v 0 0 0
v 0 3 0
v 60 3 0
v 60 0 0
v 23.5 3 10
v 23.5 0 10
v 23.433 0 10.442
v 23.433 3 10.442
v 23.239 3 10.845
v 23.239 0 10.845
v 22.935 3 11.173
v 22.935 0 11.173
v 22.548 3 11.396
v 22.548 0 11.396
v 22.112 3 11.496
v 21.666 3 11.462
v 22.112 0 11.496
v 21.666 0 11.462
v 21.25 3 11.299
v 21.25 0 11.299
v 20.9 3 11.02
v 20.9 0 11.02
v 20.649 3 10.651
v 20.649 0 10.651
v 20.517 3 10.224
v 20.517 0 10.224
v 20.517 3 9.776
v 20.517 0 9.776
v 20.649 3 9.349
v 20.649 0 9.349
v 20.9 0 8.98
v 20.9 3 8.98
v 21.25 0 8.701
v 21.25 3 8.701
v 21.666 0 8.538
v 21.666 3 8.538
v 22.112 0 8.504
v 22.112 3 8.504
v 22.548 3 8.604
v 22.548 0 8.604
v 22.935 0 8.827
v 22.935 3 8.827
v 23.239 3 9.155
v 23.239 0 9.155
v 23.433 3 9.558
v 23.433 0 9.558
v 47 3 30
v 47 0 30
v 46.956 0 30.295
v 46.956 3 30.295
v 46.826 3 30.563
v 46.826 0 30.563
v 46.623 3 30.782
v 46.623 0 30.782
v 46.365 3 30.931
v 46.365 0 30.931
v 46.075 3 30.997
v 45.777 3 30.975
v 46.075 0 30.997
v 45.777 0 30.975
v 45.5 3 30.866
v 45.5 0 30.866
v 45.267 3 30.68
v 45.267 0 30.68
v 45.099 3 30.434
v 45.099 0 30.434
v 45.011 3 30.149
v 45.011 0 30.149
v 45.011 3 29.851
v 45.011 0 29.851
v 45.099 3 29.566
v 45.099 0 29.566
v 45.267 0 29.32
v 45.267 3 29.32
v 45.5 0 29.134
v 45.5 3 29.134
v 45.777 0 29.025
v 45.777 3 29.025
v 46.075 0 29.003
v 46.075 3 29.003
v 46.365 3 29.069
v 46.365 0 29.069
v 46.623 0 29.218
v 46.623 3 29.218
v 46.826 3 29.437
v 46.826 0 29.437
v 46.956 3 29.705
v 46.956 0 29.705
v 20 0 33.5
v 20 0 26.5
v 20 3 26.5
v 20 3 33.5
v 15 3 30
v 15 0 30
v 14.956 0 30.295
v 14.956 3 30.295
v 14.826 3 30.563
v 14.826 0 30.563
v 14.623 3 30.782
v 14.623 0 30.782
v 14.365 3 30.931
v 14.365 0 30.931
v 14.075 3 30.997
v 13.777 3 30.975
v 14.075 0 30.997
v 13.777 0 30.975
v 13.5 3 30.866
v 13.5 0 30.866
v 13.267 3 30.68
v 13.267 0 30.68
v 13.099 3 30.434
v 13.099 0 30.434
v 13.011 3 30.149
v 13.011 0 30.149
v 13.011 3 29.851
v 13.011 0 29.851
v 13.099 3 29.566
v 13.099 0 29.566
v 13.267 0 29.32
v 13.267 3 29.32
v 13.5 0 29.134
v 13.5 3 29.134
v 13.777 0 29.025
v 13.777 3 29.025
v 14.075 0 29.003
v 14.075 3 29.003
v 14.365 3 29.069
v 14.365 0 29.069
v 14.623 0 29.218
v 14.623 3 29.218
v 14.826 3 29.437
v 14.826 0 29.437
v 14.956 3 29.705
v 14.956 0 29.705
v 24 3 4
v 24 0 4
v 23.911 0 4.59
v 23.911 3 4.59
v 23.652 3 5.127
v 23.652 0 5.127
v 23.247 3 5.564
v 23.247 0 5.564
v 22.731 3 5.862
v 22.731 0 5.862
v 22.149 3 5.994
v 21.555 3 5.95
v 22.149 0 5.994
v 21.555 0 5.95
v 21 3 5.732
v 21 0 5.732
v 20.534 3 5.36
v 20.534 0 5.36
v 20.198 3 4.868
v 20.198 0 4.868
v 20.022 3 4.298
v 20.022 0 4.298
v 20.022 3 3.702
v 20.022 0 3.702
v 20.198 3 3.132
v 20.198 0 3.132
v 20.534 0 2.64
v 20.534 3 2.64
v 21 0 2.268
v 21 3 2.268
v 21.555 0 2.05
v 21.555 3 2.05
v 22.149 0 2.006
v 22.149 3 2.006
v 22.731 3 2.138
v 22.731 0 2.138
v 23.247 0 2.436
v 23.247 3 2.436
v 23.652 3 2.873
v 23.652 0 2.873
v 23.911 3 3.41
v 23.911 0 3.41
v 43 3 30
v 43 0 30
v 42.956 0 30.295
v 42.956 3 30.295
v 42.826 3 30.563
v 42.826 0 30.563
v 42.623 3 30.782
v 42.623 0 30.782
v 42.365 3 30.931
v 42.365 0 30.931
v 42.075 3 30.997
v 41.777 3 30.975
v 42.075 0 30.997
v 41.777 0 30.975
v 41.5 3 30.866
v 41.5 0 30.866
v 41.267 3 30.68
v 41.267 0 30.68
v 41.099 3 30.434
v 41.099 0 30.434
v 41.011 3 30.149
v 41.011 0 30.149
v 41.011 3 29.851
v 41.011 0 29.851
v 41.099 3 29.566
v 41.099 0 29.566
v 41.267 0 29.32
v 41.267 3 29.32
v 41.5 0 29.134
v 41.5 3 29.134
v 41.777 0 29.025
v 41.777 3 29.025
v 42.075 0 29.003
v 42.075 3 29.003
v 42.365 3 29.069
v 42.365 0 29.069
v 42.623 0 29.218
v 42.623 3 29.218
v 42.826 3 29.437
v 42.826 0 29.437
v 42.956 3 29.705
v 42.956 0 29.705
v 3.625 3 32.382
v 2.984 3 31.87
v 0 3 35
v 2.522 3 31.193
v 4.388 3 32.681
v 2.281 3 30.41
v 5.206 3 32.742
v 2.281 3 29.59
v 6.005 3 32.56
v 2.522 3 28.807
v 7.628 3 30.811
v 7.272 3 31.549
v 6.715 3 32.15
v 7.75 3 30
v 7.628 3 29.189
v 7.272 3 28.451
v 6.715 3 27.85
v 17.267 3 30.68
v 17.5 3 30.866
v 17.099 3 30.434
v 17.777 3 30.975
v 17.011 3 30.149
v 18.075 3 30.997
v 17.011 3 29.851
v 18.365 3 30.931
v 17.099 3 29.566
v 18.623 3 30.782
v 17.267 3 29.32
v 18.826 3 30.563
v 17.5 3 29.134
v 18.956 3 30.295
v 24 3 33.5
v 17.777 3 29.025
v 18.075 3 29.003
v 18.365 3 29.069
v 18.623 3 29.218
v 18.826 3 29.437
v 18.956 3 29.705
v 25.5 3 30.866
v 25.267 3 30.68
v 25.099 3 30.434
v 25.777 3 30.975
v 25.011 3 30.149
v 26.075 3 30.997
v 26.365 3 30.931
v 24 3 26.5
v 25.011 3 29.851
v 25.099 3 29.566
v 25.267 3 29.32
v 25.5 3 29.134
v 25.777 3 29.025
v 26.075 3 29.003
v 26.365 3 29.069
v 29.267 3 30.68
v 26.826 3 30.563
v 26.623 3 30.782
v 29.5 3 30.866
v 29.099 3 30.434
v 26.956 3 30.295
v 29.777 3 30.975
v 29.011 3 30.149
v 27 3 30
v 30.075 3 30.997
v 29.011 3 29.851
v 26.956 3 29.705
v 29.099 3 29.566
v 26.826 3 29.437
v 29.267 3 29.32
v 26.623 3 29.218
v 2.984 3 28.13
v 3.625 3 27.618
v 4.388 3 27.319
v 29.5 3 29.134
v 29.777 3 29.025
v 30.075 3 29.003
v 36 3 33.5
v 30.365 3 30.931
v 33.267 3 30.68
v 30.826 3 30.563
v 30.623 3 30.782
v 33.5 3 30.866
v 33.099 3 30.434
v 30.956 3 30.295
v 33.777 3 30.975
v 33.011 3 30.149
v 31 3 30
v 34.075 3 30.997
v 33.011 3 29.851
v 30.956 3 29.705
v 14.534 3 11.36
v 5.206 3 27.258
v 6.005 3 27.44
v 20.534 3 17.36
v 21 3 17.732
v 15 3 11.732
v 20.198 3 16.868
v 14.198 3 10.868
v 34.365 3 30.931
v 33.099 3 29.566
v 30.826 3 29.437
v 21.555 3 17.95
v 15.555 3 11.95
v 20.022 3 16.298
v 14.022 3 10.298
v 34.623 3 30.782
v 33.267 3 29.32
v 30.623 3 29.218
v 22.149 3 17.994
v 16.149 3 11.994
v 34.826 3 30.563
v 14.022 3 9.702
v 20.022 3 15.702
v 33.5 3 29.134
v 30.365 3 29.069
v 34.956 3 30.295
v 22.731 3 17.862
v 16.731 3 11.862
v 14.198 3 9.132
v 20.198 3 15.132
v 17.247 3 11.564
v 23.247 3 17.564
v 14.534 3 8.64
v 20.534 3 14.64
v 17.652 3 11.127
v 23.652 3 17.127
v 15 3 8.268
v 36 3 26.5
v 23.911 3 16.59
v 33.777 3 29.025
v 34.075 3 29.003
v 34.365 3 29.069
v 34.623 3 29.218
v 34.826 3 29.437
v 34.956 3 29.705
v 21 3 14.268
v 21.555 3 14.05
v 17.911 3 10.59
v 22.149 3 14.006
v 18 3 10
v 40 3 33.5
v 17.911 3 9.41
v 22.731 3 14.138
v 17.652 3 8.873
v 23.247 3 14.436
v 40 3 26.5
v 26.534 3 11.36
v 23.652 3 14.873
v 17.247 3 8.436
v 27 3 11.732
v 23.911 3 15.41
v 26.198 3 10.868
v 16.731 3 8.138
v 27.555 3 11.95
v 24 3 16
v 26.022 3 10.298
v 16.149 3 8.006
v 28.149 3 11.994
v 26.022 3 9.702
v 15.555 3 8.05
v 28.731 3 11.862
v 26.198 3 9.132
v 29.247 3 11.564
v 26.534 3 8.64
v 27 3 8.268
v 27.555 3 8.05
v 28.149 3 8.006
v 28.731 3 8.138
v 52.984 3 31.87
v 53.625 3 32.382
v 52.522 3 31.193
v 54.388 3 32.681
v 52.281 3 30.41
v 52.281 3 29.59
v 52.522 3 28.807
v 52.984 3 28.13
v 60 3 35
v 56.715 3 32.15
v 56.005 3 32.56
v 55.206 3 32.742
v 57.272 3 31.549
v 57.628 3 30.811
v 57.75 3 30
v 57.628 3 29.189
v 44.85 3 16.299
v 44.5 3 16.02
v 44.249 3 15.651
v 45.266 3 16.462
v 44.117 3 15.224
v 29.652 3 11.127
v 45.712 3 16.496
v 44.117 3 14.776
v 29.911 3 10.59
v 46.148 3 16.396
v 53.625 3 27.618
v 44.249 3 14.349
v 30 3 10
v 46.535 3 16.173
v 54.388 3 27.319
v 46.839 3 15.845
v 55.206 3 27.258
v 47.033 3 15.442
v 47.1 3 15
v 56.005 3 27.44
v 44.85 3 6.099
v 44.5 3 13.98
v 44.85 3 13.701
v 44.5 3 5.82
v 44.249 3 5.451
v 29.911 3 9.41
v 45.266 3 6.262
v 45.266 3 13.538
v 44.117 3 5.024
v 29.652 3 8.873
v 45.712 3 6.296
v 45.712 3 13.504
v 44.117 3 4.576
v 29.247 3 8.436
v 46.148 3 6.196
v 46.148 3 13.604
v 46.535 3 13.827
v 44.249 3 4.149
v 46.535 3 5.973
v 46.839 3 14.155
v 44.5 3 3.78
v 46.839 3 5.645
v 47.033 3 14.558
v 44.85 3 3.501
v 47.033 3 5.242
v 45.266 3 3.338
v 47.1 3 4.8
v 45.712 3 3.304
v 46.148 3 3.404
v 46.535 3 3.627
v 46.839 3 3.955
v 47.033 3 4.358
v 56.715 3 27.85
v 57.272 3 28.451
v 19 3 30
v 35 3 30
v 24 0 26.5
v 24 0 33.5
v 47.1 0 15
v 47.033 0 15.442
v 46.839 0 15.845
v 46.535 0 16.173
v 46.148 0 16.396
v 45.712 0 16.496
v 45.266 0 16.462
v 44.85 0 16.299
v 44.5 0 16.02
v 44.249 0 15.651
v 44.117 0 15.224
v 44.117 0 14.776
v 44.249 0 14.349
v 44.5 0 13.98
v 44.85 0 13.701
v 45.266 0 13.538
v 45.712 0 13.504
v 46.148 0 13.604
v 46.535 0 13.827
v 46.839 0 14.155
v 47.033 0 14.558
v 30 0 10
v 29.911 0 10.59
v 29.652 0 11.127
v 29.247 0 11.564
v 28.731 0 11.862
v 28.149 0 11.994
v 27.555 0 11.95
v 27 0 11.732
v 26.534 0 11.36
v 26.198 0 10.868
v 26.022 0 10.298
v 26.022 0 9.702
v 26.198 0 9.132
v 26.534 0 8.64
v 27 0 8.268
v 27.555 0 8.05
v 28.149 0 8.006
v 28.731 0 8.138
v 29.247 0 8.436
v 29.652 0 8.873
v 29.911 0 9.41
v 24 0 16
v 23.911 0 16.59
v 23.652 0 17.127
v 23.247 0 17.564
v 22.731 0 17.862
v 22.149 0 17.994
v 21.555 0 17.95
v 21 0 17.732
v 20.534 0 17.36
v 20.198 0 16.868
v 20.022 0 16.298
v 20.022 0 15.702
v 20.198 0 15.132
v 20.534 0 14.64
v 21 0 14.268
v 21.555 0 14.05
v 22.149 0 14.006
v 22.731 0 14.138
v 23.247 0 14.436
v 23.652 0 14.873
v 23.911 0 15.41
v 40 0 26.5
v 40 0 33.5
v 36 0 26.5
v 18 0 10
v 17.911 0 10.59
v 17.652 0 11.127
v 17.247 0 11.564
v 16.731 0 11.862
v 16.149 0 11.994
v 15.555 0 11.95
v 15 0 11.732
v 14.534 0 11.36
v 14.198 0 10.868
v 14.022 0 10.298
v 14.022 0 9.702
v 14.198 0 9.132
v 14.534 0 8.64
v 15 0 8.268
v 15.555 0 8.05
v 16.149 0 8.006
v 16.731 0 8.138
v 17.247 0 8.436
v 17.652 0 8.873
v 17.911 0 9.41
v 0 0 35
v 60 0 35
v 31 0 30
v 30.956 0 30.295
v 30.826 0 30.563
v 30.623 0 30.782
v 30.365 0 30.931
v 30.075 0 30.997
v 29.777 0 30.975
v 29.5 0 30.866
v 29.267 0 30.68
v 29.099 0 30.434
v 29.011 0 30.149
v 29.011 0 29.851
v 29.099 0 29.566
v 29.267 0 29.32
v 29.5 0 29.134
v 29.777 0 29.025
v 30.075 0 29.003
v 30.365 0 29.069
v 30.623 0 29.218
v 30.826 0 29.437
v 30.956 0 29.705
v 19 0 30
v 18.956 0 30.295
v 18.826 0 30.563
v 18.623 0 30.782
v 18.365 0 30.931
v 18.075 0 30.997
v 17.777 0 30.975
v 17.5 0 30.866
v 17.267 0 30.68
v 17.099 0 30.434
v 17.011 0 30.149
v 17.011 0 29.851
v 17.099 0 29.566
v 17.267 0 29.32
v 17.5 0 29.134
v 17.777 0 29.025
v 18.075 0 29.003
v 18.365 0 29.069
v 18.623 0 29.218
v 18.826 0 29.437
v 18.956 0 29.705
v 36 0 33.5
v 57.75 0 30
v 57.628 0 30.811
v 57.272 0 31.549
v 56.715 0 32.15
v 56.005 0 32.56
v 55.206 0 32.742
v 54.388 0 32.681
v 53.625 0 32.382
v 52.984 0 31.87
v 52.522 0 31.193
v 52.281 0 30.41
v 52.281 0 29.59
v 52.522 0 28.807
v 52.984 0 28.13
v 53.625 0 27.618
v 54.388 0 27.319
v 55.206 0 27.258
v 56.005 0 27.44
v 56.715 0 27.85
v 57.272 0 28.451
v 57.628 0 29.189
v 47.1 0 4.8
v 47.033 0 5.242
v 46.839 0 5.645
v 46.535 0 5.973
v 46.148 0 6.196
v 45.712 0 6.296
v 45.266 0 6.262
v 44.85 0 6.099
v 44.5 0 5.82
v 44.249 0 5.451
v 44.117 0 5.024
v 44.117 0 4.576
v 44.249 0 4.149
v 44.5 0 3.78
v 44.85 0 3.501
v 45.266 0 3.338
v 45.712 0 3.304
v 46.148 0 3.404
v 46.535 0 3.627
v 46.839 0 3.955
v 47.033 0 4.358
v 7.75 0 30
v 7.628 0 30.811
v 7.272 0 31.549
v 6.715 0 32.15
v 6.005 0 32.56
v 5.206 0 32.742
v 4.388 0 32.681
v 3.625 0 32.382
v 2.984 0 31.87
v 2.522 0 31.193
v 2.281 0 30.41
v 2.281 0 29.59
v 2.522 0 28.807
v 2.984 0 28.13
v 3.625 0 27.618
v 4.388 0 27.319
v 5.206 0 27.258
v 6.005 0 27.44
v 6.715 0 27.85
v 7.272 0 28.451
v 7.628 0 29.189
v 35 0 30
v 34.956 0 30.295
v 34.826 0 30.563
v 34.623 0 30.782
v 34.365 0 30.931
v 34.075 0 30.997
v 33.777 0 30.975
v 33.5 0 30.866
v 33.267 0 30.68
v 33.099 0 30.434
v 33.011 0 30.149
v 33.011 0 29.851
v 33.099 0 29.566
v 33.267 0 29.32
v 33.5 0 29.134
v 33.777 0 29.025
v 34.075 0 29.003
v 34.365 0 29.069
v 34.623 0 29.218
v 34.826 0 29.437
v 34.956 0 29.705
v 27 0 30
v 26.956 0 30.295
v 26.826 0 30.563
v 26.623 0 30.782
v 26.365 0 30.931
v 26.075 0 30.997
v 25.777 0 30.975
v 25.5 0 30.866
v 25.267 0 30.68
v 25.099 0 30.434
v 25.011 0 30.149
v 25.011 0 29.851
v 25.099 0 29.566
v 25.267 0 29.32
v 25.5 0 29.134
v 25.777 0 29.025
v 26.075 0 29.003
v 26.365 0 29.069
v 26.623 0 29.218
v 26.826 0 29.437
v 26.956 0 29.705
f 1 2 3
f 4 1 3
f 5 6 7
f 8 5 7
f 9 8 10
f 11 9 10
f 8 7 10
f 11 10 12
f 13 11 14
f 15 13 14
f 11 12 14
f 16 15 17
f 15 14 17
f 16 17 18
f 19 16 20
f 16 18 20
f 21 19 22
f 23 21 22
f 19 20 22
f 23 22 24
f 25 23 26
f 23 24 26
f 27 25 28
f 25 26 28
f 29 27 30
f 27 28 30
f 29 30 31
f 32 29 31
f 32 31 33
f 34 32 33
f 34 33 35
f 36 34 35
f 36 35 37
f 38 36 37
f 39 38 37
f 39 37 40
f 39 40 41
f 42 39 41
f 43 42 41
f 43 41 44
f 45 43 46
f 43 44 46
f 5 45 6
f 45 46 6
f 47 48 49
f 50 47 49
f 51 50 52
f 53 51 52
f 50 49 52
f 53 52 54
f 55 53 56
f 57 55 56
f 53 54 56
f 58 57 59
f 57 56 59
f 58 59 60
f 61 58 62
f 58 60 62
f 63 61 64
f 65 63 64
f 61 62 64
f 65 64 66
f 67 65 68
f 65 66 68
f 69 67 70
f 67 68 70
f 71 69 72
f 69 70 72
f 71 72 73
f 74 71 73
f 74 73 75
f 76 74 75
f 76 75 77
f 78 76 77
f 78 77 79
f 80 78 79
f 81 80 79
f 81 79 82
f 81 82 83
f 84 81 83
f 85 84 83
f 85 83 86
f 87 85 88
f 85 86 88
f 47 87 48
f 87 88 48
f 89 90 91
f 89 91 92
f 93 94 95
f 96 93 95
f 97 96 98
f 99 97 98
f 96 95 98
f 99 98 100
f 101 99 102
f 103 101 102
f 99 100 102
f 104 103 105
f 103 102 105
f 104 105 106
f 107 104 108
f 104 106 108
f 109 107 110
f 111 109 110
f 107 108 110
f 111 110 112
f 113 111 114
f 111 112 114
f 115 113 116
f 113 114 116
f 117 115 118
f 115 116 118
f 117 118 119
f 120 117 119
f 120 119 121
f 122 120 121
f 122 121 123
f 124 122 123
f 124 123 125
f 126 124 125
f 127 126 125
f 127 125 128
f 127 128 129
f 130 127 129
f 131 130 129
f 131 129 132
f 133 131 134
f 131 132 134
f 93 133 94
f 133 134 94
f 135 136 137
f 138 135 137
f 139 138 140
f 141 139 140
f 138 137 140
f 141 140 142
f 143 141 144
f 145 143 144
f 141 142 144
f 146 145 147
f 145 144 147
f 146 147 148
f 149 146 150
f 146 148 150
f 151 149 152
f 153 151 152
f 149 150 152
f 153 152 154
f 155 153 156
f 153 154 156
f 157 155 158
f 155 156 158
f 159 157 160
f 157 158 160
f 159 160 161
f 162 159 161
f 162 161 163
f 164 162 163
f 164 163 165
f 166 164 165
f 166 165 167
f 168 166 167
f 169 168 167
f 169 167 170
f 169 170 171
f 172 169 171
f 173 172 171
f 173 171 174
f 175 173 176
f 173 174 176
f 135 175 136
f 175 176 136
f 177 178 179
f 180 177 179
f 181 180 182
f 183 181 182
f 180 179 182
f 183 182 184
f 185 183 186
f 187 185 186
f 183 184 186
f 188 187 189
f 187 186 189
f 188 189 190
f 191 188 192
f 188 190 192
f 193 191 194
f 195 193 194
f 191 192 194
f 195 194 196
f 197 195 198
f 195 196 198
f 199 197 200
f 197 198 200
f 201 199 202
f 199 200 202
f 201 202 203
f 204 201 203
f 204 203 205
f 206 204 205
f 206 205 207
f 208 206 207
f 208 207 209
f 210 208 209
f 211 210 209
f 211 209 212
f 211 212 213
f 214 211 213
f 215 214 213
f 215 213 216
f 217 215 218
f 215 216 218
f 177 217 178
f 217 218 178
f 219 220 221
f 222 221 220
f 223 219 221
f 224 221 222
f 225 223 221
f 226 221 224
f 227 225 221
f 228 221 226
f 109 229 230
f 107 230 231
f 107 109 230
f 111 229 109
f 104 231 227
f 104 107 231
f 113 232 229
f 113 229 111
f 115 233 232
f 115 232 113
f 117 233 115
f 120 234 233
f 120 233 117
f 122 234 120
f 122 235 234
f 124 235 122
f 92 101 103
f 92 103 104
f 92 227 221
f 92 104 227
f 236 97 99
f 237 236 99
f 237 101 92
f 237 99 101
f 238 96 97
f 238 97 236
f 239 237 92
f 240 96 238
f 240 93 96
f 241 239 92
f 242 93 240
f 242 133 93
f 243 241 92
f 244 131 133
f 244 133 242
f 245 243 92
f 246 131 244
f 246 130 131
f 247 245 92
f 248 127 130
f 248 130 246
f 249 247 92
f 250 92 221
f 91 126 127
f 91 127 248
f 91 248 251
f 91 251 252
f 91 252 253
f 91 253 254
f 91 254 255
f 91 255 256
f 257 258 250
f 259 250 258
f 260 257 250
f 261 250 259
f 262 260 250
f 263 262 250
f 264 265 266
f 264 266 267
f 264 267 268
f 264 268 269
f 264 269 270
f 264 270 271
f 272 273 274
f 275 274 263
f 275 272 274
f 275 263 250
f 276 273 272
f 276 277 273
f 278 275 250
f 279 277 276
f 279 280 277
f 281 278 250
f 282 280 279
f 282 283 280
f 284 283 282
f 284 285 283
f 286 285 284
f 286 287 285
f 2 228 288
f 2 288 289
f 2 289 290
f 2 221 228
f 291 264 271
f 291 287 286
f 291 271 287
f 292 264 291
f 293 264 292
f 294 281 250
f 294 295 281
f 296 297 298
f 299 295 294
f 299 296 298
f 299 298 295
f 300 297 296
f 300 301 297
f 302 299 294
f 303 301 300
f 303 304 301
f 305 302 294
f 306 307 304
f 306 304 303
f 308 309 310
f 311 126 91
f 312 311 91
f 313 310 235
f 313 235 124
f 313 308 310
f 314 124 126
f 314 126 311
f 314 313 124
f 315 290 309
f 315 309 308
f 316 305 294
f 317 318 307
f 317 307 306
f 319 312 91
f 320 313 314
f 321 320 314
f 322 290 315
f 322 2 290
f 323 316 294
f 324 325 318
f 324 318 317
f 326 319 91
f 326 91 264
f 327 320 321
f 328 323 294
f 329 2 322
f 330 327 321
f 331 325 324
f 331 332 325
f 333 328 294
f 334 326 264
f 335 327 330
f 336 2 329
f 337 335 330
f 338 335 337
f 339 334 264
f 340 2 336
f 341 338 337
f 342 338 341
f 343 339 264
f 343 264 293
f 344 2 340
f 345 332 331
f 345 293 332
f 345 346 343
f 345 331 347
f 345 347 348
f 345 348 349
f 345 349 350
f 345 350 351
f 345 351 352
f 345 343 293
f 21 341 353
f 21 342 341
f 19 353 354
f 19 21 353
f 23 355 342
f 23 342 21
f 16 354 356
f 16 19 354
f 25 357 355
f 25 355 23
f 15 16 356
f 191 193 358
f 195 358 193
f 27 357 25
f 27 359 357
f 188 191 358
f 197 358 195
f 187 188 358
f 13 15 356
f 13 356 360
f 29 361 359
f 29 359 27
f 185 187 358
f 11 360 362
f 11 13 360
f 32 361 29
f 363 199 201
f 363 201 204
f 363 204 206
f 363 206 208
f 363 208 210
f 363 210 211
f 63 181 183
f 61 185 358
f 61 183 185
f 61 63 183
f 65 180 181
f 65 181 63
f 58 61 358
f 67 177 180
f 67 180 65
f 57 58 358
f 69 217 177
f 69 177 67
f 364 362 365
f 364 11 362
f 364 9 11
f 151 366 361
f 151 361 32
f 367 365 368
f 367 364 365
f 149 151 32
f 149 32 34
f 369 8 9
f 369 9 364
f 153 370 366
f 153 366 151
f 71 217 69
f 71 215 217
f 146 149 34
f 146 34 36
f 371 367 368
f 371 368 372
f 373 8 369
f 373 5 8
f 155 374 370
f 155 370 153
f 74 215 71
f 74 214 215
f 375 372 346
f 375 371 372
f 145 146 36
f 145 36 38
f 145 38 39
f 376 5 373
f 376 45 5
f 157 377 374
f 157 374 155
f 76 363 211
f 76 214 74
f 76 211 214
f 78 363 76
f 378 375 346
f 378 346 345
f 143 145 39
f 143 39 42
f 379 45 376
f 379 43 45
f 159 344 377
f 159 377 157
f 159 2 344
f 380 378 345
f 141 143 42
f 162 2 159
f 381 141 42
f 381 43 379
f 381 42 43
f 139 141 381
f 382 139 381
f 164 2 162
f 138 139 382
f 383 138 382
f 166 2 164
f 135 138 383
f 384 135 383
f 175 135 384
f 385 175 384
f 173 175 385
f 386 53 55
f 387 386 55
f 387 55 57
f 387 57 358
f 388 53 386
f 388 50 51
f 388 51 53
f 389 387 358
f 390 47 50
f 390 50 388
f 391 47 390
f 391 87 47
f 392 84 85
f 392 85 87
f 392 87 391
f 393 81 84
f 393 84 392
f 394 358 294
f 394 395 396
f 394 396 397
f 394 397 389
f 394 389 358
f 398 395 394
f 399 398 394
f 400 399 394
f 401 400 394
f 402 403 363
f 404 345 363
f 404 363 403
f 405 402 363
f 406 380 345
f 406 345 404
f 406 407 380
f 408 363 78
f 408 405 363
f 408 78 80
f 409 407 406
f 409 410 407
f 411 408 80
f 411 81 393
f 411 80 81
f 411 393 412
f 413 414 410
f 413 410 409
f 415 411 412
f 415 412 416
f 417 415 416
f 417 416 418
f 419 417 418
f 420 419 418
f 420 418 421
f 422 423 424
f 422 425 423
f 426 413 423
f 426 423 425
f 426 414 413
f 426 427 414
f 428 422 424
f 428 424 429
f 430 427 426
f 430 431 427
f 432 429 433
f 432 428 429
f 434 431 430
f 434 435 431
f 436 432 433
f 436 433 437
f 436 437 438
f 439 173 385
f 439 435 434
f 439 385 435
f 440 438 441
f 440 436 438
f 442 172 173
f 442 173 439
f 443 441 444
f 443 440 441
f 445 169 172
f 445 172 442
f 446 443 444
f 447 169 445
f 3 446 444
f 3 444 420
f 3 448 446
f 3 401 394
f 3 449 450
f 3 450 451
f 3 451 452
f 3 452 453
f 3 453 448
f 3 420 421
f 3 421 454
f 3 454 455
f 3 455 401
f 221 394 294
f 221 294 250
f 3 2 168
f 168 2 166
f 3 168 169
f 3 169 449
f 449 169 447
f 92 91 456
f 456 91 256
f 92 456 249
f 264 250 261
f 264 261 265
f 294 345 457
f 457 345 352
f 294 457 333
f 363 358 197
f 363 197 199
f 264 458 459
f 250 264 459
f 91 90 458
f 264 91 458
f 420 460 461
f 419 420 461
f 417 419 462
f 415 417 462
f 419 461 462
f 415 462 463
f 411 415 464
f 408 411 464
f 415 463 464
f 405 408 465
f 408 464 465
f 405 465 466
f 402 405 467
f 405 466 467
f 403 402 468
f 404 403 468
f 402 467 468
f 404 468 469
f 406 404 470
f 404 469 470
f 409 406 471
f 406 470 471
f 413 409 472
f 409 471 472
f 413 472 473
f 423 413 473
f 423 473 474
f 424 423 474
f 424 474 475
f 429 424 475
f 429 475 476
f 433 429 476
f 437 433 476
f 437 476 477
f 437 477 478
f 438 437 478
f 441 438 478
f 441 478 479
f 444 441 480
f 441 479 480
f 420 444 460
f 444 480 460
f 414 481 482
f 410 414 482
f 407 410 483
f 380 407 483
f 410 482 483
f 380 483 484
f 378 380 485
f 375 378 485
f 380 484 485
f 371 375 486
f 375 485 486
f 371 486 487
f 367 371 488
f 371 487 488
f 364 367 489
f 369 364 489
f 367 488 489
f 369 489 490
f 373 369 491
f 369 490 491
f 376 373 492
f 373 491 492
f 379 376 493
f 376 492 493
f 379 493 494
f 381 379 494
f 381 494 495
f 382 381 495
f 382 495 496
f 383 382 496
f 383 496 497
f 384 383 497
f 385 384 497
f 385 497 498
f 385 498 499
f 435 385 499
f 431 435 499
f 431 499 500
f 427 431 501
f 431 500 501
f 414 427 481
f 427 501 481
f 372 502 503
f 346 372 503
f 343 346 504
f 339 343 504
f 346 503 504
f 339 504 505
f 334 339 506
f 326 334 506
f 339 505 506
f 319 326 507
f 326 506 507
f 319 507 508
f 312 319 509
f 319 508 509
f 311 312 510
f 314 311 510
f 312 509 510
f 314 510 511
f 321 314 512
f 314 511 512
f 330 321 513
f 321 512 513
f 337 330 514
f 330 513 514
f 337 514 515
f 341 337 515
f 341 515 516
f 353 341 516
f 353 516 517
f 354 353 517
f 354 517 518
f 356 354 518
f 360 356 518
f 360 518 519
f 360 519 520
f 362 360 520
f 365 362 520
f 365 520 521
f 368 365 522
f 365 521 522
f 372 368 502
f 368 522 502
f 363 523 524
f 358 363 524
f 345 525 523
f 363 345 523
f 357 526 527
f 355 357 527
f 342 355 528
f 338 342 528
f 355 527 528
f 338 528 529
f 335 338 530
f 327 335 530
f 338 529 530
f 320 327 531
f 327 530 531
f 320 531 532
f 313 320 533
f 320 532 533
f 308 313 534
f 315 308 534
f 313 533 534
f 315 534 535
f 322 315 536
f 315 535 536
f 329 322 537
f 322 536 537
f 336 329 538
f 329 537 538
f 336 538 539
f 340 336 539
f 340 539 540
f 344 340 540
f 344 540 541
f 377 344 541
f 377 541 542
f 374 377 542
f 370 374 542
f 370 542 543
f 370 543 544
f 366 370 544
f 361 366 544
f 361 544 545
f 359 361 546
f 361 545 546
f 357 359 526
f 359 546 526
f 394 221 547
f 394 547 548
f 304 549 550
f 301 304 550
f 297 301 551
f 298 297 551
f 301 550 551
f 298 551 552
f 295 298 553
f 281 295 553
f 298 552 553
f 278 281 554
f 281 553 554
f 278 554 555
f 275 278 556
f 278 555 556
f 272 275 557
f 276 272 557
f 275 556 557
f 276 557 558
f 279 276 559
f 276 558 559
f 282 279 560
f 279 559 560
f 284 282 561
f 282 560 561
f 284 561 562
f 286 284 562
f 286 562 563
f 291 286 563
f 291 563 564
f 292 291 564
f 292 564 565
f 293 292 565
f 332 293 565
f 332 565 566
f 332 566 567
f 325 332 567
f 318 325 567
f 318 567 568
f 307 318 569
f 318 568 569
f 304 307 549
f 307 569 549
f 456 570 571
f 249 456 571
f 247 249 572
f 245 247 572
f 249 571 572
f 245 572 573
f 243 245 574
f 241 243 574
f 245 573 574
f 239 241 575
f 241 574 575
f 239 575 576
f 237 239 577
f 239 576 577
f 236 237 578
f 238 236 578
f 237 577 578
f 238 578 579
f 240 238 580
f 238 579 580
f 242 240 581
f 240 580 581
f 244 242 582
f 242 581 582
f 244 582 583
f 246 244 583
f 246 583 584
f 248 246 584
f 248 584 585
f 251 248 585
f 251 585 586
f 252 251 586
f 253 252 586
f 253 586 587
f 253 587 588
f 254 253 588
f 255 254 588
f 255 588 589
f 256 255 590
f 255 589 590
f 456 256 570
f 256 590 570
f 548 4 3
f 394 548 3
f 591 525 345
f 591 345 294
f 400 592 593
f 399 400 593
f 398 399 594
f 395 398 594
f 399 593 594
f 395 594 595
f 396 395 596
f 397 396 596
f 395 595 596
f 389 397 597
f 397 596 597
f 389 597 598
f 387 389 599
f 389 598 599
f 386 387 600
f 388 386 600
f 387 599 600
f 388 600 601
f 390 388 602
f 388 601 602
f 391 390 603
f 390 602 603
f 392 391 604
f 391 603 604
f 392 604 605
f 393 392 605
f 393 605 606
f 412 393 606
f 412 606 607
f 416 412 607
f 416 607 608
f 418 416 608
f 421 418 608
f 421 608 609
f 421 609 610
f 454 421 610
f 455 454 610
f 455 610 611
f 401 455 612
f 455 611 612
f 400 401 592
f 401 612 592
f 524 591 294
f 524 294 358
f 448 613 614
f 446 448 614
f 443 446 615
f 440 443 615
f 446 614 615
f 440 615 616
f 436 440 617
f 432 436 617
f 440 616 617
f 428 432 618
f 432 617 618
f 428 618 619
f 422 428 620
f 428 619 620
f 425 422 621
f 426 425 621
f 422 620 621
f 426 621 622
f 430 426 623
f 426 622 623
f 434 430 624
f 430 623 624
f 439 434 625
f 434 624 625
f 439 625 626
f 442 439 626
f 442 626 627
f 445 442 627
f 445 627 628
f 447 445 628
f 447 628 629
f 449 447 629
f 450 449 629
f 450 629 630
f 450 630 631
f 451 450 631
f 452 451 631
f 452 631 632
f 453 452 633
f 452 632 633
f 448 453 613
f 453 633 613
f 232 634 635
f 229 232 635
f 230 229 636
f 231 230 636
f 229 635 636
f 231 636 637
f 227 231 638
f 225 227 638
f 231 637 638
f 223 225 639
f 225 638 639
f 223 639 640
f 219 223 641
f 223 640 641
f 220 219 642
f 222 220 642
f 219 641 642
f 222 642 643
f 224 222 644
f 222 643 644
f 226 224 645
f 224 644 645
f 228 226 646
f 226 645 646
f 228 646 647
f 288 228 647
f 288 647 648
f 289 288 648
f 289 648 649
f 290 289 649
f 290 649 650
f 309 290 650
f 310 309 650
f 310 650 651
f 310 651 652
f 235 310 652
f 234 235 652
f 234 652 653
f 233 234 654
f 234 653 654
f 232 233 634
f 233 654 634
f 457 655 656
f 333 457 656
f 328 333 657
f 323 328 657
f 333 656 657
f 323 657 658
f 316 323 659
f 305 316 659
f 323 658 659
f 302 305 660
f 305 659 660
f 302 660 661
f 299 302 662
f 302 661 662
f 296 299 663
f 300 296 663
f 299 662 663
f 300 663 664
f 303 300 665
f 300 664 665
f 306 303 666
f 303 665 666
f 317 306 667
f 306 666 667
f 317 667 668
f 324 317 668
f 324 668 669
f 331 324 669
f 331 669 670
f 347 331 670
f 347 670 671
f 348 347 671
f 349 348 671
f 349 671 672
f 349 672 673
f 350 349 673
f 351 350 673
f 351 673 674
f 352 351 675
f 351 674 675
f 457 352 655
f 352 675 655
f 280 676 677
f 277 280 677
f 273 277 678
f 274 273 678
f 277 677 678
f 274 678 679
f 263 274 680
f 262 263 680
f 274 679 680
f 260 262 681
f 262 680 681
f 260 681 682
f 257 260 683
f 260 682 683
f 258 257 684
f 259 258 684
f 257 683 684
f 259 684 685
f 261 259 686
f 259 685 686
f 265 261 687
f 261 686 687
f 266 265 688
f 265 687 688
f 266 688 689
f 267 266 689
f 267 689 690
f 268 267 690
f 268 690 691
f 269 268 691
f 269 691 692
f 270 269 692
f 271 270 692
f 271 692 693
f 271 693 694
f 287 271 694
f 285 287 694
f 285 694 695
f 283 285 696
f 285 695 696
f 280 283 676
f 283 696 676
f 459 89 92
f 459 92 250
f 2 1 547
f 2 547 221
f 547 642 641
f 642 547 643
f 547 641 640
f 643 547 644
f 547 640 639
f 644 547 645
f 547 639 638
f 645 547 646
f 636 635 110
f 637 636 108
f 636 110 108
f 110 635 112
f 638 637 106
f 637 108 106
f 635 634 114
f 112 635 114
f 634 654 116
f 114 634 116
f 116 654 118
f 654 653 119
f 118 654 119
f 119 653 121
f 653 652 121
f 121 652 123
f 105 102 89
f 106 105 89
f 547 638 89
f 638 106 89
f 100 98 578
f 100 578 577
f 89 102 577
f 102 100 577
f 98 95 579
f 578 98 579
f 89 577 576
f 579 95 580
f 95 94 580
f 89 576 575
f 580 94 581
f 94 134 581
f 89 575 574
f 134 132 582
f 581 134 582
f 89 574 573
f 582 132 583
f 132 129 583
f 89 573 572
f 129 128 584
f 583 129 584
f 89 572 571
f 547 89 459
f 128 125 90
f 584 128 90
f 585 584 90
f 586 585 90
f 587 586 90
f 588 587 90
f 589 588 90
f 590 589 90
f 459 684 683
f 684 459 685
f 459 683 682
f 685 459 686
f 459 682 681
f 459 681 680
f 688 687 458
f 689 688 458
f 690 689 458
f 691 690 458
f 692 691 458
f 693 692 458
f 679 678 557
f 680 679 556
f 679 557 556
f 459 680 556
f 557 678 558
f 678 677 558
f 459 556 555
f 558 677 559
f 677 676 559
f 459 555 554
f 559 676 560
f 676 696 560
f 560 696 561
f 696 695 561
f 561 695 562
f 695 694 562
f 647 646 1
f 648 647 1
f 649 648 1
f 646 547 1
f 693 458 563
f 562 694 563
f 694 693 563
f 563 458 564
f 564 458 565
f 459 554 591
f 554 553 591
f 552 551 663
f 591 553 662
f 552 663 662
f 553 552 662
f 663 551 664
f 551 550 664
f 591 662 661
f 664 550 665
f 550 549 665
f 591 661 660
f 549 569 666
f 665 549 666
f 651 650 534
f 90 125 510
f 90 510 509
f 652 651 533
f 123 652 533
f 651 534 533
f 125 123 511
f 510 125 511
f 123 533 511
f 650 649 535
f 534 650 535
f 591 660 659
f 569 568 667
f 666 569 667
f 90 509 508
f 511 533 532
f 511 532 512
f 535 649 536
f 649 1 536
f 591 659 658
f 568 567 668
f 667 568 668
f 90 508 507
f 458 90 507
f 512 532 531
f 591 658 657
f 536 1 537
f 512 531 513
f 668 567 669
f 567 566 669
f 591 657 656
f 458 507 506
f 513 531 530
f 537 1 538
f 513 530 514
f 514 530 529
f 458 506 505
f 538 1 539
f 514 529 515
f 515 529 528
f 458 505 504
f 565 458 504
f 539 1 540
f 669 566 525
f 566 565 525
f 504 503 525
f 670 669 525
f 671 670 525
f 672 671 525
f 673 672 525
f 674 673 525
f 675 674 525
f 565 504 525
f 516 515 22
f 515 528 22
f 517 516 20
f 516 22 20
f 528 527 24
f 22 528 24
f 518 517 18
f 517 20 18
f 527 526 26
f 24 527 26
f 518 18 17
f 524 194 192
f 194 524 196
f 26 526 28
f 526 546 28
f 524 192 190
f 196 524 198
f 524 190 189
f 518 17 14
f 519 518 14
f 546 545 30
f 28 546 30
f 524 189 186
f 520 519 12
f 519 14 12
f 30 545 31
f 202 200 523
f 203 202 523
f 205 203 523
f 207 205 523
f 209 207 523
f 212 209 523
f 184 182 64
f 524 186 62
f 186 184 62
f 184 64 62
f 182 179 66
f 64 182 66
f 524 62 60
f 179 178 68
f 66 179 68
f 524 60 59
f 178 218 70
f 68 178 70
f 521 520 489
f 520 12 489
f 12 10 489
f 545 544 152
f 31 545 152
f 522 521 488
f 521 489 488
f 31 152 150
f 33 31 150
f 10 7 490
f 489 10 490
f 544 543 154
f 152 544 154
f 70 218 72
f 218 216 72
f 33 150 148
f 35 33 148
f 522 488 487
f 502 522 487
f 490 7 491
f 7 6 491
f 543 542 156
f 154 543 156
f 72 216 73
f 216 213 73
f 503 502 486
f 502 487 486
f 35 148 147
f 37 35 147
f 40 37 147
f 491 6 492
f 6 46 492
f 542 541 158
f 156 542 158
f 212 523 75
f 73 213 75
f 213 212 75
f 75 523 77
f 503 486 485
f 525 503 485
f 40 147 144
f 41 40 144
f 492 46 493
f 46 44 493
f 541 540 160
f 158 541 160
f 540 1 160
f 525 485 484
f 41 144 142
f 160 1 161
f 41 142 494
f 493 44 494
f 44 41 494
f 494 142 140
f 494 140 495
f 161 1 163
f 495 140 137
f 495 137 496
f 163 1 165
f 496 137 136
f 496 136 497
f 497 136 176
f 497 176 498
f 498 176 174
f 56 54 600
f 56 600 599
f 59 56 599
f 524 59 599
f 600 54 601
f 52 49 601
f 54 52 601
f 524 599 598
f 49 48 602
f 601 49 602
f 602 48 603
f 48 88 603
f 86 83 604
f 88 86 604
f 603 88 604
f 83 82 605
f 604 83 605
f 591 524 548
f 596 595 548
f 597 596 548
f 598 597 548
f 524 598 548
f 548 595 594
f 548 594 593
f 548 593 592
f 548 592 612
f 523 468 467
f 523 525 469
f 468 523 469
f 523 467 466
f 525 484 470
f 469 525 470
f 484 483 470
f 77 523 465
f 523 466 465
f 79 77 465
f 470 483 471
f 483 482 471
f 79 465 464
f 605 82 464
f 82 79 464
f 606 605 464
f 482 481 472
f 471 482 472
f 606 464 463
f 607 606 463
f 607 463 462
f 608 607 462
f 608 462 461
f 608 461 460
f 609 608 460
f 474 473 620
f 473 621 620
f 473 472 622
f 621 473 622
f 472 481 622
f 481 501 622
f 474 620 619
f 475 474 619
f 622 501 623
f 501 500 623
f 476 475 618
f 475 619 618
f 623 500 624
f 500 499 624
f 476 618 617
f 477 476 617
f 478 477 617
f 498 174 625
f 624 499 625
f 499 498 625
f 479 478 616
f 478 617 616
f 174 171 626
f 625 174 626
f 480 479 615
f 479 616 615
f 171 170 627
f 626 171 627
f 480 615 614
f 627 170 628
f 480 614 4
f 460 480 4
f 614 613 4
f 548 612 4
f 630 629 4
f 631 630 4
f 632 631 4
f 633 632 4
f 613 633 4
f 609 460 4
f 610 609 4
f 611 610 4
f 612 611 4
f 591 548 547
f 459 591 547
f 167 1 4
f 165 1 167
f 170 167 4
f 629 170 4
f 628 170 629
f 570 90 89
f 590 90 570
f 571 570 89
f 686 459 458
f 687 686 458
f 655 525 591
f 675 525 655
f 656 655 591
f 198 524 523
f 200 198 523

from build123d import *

# Parameters (mm, degrees)
SKETCH_W      = 60
SKETCH_H      = 3
PAD_DEPTH     = 35
SKETCH001_R   = 1.5
SKETCH001_R_2 = 2
SKETCH001_R_3 = 2.75
SKETCH001_R_4 = 1
SKETCH001_W   = 4
SKETCH001_H   = 7
POCKET_DEPTH  = 3


with BuildPart() as part:
    # Sketch → Pad (new body)
    with BuildSketch(Plane.XY):
        with Locations((30, 1.5)):
            Rectangle(SKETCH_W, SKETCH_H)
    extrude(amount=PAD_DEPTH)

    # Sketch001 → Pocket (cut)
    with BuildSketch(Plane.XZ):
        with Locations((22, 10)):
            Circle(SKETCH001_R)
        with Locations((28, 10)):
            Circle(SKETCH001_R_2)
        with Locations((22, 16)):
            Circle(SKETCH001_R_2)
        with Locations((16, 10)):
            Circle(SKETCH001_R_2)
        with Locations((22, 4)):
            Circle(SKETCH001_R_2)
        with Locations((5, 30)):
            Circle(SKETCH001_R_3)
        with Locations((55, 30)):
            Circle(SKETCH001_R_3)
        with Locations((14, 30)):
            Circle(SKETCH001_R_4)
        with Locations((18, 30)):
            Circle(SKETCH001_R_4)
        with Locations((26, 30)):
            Circle(SKETCH001_R_4)
        with Locations((30, 30)):
            Circle(SKETCH001_R_4)
        with Locations((34, 30)):
            Circle(SKETCH001_R_4)
        with Locations((42, 30)):
            Circle(SKETCH001_R_4)
        with Locations((46, 30)):
            Circle(SKETCH001_R_4)
        with Locations((45.6, 15)):
            Circle(SKETCH001_R)
        with Locations((45.6, 4.8)):
            Circle(SKETCH001_R)
        with Locations((22, 30)):
            Rectangle(SKETCH001_W, SKETCH001_H)
        with Locations((38, 30)):
            Rectangle(SKETCH001_W, SKETCH001_H)
    extrude(amount=-POCKET_DEPTH, mode=Mode.SUBTRACT)


solid = part.part
